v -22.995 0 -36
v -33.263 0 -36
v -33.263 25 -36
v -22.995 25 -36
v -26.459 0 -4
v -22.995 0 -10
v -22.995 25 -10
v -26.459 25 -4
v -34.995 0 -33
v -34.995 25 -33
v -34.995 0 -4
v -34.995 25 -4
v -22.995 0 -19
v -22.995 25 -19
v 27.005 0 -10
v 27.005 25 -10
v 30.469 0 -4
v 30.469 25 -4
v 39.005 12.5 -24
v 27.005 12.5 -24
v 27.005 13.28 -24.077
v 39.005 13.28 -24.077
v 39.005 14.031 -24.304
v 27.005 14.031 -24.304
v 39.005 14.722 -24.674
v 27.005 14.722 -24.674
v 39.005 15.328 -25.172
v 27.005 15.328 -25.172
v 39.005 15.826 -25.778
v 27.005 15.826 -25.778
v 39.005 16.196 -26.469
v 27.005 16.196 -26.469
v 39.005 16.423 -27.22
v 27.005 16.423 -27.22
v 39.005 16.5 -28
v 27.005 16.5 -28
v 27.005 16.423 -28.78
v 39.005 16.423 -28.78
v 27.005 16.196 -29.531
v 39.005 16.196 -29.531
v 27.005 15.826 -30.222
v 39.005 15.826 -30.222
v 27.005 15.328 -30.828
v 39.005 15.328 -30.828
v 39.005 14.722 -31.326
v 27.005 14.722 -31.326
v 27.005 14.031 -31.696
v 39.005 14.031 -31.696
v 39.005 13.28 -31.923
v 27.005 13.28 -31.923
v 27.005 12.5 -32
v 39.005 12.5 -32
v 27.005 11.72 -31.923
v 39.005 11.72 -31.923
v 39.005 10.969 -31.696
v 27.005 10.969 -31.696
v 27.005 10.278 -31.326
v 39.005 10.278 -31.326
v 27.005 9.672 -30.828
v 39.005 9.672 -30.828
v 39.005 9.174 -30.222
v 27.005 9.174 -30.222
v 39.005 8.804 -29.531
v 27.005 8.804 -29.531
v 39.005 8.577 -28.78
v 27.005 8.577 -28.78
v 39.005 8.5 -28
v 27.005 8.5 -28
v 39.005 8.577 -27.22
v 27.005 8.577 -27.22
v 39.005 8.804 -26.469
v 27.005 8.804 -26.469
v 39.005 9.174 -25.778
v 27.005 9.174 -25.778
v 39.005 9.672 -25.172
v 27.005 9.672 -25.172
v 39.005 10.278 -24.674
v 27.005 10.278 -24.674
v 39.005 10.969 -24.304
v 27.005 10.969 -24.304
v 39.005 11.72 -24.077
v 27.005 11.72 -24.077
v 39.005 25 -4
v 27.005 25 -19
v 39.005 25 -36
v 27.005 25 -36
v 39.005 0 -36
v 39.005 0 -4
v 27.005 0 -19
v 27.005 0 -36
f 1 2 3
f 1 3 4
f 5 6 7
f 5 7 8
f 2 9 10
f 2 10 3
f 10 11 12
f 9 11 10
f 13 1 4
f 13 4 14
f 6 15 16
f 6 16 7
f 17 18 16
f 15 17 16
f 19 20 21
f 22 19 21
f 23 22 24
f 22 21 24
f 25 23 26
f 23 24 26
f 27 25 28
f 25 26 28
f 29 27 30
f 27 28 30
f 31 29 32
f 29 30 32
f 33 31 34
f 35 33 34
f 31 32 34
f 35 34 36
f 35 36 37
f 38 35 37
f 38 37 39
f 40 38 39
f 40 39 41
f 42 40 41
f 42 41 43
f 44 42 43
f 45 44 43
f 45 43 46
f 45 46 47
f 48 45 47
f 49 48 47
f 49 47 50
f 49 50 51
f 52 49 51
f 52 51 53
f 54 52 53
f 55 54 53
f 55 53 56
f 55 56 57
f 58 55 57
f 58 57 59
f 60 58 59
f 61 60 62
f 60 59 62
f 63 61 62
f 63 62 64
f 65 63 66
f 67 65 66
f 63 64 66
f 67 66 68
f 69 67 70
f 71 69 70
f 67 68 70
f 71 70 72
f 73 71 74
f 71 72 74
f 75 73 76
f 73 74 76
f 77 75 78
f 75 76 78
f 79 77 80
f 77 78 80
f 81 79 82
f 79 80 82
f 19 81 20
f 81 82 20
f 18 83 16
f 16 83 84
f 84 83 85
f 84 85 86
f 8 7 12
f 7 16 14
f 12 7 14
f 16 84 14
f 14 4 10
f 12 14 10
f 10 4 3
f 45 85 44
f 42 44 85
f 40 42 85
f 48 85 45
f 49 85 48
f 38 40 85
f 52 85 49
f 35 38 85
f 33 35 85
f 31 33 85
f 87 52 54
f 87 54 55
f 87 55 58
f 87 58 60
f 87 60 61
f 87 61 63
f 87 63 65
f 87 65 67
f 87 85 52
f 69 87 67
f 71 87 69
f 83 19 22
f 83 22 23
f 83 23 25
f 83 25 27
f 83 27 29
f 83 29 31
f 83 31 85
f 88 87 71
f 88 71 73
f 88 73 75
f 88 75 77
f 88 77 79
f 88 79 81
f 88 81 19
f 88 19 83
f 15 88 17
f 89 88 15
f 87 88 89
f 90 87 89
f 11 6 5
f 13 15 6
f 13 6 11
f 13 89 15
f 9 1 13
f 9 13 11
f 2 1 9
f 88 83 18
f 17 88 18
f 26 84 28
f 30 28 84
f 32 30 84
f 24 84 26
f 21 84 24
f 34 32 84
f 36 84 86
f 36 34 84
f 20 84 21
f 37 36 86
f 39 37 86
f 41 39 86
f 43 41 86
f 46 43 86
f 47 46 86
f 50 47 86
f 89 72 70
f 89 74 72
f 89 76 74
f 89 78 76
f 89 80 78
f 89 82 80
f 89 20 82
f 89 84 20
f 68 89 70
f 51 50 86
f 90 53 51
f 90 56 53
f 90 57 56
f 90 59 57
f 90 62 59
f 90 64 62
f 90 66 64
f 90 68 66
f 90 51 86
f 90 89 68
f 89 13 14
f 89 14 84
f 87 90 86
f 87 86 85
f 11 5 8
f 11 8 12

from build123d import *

# Parameters (mm, degrees)
BOSS_EXTRUDE1_DEPTH       = 25
F_8_0MM_DOWEL_HOLE2_D     = 8
F_8_0MM_DOWEL_HOLE2_DEPTH = 12


with BuildPart() as part:
    # Sketch1 → Boss-Extrude1 (new body)
    with BuildSketch(Plane(origin=(0, 0, 0), x_dir=(1, 0, 0), z_dir=(0, 1, 0))):
        Polygon((-34.995258132, 4), (-34.995258132, 33), (-33.263207324, 36), (-22.995258132, 36), (-22.995258132, 19), (27.004741868, 19), (27.004741868, 36), (39.004741868, 36), (39.004741868, 4), (30.468843483, 4), (27.004741868, 10), (-22.995258132, 10), (-26.459359747, 4), align=None)
    extrude(amount=BOSS_EXTRUDE1_DEPTH)

    # Ø8.0mm Dowel Hole2
    with Locations(Plane(origin=(39.004741868, 0, 0), x_dir=(0, 0, -1), z_dir=(1, 0, 0))):
        with Locations((28, 12.5)):
            Hole(F_8_0MM_DOWEL_HOLE2_D / 2, depth=F_8_0MM_DOWEL_HOLE2_DEPTH)


solid = part.part
